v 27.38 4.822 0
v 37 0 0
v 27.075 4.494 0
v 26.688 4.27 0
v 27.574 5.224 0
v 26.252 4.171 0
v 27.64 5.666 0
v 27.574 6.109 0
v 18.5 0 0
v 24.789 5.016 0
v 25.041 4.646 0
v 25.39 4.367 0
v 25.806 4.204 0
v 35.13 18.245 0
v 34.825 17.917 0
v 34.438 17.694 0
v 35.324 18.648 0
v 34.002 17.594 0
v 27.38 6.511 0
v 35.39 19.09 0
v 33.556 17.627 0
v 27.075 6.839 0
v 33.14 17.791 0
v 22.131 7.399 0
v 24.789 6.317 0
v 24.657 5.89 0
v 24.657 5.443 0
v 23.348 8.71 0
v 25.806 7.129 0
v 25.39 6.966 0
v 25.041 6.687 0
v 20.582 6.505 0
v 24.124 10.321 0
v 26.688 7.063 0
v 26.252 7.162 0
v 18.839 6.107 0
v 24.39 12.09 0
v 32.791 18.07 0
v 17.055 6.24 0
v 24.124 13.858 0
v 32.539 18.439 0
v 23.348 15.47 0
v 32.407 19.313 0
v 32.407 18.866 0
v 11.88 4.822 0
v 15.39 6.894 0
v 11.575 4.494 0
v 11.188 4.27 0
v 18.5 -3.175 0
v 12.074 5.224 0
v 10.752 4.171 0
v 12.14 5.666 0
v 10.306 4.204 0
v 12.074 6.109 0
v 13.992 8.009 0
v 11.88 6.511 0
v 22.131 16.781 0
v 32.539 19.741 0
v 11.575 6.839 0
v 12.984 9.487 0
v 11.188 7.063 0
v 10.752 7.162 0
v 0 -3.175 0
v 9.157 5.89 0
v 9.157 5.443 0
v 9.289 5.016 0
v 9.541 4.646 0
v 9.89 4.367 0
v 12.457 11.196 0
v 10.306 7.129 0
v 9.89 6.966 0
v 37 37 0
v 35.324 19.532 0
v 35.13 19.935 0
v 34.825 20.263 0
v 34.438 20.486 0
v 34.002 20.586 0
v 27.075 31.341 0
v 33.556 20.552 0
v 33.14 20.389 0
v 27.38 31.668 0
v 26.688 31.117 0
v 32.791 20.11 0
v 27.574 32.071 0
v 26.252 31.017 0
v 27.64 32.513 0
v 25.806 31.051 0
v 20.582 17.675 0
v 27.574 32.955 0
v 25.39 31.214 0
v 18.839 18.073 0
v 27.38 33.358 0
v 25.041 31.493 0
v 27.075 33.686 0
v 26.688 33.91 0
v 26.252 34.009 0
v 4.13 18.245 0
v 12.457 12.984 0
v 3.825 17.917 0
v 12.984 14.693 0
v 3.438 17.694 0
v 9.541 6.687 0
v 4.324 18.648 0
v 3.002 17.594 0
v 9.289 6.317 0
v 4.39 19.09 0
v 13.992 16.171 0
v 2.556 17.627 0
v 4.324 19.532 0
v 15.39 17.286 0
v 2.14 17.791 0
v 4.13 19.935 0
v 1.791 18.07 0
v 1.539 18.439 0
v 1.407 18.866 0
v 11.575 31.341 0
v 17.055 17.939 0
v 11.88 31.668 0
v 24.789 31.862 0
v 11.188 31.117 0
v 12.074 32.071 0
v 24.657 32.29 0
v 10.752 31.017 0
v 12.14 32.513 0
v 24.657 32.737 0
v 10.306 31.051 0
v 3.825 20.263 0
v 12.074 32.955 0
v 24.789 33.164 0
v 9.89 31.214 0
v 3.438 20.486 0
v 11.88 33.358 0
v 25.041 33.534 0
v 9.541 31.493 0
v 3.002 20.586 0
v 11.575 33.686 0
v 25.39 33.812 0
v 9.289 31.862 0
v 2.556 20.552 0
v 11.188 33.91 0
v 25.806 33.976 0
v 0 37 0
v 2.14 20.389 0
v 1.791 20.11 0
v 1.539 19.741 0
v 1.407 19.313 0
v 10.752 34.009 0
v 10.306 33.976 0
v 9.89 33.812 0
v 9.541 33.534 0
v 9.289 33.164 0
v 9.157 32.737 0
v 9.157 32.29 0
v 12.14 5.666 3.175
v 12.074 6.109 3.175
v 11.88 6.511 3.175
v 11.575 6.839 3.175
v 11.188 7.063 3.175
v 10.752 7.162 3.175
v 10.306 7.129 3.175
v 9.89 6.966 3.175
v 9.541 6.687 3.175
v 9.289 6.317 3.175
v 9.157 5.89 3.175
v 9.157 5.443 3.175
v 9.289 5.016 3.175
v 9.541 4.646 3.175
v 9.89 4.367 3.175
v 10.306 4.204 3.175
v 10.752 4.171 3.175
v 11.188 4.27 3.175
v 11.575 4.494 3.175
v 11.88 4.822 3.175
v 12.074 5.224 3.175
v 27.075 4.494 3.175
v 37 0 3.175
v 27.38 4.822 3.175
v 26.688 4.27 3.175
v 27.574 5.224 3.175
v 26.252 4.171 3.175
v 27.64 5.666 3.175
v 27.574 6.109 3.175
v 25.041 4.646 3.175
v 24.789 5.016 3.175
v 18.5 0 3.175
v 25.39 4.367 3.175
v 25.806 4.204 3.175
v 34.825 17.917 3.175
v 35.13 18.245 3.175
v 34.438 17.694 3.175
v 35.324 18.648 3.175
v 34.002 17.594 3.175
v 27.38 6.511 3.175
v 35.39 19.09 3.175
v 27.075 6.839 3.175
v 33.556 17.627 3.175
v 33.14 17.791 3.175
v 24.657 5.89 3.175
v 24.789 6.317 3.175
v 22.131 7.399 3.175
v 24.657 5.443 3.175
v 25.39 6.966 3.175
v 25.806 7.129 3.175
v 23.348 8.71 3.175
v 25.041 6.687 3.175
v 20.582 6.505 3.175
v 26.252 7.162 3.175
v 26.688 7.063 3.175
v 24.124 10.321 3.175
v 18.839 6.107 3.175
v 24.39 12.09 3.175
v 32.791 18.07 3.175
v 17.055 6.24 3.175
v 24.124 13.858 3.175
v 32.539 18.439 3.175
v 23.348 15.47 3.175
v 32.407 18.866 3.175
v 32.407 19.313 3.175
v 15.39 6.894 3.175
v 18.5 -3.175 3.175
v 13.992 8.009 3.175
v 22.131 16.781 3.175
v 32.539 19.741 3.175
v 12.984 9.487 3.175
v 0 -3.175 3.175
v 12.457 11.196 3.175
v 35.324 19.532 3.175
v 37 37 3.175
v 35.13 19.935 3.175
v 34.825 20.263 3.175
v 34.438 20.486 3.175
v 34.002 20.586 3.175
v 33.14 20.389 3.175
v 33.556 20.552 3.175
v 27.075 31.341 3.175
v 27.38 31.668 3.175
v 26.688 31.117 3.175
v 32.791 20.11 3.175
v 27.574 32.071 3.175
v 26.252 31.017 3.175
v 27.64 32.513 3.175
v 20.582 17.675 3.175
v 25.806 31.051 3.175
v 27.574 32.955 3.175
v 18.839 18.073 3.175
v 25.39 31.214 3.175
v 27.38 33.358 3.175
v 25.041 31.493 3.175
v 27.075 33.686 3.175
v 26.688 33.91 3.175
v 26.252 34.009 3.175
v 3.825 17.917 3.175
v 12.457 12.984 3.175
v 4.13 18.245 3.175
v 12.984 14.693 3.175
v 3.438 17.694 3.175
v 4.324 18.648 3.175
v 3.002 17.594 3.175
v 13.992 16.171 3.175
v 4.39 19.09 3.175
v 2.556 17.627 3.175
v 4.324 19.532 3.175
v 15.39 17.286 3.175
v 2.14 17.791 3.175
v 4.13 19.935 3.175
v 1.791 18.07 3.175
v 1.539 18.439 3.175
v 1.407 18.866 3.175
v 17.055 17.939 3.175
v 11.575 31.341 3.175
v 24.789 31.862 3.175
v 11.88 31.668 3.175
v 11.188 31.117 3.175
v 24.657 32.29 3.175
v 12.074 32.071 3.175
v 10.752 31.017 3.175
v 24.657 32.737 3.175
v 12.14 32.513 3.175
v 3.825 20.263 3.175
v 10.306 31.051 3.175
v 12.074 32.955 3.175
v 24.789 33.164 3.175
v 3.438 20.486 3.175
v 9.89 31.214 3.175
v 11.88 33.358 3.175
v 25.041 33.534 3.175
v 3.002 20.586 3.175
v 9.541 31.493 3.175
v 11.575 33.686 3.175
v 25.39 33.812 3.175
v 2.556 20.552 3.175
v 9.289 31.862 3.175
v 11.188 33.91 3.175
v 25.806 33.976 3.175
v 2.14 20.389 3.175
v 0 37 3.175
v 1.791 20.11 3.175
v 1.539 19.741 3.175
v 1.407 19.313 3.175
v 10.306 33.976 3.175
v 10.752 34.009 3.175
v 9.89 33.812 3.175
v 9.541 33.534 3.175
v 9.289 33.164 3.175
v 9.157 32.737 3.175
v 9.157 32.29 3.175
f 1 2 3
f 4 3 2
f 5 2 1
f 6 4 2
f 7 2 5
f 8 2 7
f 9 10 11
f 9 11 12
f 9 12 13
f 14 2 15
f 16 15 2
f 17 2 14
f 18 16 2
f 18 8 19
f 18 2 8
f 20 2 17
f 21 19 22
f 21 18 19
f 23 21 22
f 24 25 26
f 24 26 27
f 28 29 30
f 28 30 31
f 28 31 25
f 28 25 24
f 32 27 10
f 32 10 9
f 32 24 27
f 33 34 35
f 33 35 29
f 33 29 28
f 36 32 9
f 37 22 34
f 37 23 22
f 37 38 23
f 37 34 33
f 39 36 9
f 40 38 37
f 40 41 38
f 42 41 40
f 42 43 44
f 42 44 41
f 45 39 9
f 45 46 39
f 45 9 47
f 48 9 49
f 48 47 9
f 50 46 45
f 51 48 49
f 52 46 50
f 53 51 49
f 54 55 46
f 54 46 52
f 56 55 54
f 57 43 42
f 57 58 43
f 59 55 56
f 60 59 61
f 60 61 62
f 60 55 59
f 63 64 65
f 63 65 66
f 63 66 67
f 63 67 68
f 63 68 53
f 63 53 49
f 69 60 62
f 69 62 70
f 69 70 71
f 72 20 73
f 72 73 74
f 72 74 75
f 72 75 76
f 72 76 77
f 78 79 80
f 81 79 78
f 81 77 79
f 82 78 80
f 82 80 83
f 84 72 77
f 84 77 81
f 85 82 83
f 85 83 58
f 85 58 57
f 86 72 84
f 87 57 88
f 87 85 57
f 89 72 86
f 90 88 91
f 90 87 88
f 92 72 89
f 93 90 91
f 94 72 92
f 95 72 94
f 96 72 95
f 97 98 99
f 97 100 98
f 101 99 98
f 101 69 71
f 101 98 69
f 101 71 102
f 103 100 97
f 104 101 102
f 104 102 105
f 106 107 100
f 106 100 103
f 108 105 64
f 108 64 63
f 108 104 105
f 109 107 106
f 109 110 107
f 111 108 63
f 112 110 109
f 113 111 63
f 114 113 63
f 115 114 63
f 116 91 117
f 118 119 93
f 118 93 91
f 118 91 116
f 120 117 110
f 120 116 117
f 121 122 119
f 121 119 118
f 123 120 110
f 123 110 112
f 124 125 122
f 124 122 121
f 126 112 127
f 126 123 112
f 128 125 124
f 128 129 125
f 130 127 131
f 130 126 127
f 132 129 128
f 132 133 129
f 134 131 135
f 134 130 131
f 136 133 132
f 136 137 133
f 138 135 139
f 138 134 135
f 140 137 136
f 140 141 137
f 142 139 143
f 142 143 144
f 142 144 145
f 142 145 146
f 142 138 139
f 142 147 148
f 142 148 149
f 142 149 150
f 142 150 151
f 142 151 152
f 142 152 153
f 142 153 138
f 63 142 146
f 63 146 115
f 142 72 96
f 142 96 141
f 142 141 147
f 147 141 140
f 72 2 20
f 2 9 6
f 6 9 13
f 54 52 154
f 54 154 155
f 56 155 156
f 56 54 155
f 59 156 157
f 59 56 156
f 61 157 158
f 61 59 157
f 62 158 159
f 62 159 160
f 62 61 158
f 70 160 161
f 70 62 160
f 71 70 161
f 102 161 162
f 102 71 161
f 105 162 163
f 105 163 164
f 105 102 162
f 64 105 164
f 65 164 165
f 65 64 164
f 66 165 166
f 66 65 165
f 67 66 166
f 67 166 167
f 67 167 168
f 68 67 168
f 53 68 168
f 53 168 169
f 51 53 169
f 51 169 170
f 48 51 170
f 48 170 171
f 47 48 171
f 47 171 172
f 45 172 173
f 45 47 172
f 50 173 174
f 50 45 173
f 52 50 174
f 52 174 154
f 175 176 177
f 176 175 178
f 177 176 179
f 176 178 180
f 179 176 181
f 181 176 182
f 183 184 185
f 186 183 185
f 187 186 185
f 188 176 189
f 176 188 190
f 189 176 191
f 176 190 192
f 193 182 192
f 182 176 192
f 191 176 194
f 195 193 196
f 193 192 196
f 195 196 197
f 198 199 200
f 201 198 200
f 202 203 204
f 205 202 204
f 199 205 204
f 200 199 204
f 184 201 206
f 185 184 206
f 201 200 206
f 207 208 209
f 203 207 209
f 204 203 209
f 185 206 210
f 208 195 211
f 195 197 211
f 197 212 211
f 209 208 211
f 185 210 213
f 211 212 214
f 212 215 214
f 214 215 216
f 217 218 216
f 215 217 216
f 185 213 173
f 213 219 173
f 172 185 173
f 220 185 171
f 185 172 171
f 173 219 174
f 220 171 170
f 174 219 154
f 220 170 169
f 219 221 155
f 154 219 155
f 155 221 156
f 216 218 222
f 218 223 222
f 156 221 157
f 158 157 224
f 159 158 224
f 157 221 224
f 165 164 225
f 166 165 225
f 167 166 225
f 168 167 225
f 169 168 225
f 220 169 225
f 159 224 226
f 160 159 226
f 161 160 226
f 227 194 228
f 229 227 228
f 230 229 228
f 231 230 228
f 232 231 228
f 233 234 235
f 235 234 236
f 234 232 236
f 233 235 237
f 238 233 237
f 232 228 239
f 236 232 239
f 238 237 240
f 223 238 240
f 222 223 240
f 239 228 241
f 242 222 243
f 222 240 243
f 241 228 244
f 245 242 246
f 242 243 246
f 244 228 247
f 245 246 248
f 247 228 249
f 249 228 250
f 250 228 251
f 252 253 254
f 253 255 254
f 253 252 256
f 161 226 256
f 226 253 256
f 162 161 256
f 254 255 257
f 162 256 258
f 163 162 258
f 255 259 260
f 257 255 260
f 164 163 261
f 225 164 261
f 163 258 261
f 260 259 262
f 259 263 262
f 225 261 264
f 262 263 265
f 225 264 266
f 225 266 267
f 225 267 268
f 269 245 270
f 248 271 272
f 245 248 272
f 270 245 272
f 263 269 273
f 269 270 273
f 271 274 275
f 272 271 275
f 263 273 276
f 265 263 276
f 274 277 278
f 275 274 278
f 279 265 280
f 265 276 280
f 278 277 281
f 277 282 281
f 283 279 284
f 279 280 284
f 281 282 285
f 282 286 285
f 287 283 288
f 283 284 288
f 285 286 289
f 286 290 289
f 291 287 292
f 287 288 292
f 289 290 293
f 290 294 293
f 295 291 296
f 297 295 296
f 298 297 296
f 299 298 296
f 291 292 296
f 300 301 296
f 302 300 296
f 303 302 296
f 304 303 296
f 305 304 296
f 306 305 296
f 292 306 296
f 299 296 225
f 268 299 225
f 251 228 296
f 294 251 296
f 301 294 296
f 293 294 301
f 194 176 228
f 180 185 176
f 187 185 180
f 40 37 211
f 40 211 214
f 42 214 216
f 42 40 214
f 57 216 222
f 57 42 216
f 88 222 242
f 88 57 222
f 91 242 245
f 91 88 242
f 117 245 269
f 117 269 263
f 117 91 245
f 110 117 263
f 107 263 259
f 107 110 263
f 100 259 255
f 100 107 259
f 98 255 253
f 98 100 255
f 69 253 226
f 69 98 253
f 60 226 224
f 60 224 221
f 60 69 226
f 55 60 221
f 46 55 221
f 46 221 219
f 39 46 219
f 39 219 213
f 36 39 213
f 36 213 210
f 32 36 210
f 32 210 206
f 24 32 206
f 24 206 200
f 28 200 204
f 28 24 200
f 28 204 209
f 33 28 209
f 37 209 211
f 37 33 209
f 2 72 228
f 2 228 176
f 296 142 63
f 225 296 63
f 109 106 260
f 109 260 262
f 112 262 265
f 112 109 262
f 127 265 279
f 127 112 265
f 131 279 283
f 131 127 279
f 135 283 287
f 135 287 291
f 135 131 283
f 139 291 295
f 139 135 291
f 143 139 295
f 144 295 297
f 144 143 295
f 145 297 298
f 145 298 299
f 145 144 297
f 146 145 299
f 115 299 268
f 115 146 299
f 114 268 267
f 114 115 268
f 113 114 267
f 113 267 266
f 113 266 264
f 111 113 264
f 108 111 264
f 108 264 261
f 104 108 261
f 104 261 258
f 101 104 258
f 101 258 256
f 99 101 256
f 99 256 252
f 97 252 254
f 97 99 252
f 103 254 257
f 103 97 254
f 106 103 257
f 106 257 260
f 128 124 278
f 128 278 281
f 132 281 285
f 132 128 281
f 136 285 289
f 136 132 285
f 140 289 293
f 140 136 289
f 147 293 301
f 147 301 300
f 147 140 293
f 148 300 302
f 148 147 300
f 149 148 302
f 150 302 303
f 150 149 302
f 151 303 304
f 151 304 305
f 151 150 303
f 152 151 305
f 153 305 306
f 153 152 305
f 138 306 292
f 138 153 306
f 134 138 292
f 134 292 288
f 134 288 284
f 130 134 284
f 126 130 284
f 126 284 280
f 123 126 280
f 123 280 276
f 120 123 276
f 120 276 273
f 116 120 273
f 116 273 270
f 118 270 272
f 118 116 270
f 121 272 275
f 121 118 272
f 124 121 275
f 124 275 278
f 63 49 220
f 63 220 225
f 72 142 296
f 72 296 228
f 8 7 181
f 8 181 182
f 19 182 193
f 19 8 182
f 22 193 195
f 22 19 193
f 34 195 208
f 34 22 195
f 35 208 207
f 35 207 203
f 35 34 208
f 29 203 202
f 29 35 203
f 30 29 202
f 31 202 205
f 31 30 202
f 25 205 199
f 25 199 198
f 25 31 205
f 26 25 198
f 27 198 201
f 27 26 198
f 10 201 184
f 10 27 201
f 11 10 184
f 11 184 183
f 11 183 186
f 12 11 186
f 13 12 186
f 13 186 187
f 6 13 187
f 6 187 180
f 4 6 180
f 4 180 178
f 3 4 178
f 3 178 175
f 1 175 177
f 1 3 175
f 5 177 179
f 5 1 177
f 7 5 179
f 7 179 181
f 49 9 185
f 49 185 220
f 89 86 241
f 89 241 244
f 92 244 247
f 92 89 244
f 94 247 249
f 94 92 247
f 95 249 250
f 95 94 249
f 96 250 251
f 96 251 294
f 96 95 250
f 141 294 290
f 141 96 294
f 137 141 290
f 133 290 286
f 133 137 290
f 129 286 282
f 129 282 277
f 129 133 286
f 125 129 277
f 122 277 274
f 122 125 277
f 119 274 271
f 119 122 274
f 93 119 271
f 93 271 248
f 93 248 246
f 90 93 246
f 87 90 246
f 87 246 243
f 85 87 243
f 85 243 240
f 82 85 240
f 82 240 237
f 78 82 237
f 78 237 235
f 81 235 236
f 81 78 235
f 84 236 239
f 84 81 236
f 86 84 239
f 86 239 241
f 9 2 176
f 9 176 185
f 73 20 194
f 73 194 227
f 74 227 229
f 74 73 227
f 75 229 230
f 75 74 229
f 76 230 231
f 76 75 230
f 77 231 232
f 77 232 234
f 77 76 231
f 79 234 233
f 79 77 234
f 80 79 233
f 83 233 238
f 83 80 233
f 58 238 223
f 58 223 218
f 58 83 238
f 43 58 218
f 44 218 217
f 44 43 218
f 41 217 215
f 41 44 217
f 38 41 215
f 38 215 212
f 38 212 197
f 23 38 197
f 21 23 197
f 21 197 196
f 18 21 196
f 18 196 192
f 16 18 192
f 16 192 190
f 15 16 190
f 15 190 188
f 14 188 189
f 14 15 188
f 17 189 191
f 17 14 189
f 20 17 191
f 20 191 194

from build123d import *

# Parameters (mm, degrees)
SKETCH1_R           = 6
SKETCH1_R_2         = 1.5
BOSS_EXTRUDE1_DEPTH = 3.175


with BuildPart() as part:
    # Sketch1 → Boss-Extrude1 (new body)
    with BuildSketch(Plane.XY):
        Polygon((18.5, 0), (18.5, -3.175), (0, -3.175), (0, 0), (0, 37), (37, 37), (37, 0), align=None)
        with Locations((18.39023312, 12.089873912)):
            Circle(SKETCH1_R, mode=Mode.SUBTRACT)
        with Locations((2.89023312, 19.089873912)):
            Circle(SKETCH1_R_2, mode=Mode.SUBTRACT)
        with Locations((10.64023312, 5.666480153)):
            Circle(SKETCH1_R_2, mode=Mode.SUBTRACT)
        with Locations((26.14023312, 5.666480153)):
            Circle(SKETCH1_R_2, mode=Mode.SUBTRACT)
        with Locations((33.89023312, 19.089873912)):
            Circle(SKETCH1_R_2, mode=Mode.SUBTRACT)
        with Locations((26.14023312, 32.513267671)):
            Circle(SKETCH1_R_2, mode=Mode.SUBTRACT)
        with Locations((10.64023312, 32.513267671)):
            Circle(SKETCH1_R_2, mode=Mode.SUBTRACT)
    extrude(amount=BOSS_EXTRUDE1_DEPTH)


solid = part.part
